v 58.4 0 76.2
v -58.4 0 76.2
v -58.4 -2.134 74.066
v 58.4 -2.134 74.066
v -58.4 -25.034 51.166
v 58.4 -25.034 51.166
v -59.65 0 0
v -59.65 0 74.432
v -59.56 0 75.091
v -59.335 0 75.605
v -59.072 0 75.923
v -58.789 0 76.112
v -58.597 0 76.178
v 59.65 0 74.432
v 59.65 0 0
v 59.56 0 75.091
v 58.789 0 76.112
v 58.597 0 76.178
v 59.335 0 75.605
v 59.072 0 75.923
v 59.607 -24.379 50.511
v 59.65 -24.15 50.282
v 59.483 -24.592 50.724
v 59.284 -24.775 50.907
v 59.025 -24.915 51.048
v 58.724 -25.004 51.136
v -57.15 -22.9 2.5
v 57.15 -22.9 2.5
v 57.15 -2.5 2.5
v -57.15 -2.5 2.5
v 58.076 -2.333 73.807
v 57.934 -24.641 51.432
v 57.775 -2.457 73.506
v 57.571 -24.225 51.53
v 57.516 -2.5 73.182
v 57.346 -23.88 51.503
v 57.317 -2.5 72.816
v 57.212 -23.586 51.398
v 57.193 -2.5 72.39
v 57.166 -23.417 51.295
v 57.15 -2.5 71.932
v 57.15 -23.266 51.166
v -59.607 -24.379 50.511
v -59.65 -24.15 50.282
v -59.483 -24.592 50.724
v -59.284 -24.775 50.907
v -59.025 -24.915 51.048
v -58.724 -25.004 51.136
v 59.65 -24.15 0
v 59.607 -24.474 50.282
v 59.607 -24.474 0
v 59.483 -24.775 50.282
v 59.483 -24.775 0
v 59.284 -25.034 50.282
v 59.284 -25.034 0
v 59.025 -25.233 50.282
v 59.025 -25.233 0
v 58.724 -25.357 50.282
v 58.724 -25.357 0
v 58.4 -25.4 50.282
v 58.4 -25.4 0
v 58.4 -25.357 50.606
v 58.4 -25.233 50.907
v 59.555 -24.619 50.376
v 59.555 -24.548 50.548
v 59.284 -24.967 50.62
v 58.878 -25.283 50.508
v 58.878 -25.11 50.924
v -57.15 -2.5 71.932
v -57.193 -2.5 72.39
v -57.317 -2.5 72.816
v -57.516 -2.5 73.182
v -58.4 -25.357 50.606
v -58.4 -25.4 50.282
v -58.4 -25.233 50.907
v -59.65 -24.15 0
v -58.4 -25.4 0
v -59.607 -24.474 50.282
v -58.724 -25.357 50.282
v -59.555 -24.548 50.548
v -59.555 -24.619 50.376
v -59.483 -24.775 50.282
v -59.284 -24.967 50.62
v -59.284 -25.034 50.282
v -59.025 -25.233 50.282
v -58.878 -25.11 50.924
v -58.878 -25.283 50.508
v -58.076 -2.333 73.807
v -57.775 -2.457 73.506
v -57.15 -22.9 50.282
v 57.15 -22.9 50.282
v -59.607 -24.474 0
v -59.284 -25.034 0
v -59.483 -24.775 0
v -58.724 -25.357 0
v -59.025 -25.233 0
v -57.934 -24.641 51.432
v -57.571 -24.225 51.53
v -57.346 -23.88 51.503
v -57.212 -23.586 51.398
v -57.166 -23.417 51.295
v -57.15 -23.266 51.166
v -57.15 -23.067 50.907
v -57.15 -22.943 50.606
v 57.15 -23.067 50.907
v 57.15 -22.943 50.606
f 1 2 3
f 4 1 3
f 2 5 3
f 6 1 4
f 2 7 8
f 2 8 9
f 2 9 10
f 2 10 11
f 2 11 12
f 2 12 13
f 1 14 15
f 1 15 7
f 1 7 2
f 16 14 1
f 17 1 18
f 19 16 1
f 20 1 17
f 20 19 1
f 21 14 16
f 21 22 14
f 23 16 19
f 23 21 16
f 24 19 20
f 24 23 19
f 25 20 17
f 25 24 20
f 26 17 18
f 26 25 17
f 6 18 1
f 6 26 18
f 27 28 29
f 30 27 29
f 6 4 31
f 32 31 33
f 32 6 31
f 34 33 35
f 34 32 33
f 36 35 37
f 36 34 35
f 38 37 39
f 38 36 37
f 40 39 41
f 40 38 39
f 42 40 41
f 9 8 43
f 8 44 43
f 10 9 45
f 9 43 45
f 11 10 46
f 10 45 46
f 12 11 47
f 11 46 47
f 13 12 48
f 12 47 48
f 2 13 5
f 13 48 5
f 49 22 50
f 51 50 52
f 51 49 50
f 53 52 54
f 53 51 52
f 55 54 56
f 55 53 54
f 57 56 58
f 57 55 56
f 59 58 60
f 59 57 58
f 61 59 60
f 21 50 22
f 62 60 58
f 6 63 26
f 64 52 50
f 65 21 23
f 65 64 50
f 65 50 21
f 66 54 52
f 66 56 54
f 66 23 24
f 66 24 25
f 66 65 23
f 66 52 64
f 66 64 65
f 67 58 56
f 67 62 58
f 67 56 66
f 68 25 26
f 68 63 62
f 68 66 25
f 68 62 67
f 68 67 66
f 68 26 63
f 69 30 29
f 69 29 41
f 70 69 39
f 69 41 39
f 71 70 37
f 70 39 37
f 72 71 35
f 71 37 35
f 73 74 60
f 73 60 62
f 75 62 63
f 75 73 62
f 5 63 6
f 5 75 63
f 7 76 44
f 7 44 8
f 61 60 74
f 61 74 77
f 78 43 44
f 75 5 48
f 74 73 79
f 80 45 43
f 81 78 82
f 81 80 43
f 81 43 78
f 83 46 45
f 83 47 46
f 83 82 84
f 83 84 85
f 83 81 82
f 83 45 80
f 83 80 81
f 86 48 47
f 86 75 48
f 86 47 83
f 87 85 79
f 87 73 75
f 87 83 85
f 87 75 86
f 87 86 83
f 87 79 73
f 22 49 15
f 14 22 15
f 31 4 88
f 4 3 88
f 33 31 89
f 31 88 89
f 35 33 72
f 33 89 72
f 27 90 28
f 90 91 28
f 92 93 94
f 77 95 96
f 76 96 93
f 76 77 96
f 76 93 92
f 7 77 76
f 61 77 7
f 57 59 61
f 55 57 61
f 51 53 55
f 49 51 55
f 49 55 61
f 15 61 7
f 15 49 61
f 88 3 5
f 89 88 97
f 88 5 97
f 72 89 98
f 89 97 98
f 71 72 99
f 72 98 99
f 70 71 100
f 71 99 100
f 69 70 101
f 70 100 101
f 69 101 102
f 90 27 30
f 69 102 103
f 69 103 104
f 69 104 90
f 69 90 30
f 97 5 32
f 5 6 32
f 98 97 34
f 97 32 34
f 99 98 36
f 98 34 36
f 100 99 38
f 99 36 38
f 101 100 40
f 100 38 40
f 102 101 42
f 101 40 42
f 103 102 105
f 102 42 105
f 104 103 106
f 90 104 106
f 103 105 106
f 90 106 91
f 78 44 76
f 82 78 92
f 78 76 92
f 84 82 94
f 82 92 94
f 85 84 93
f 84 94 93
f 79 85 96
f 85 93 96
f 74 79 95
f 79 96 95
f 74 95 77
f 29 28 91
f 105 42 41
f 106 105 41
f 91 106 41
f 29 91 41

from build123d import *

# Parameters (mm, degrees)
F1_DEPTH = 59.65
F3_DEPTH = 57.15
F4_R     = 1.24999


# Not quite as in the source:
# - a fillet or chamfer is up to 0.001 mm smaller than in the source, because OpenCascade refuses the exact size


with BuildPart() as f1:
    # F0 (on Right) → F1 (new body, symmetric)
    with BuildSketch(Plane.YZ):
        Polygon((-25.4, 0), (0, 0), (0, 76.2), (-25.4, 50.8), align=None)
    extrude(amount=F1_DEPTH, both=True)

    # F2 (on Right) → F3 (cut, symmetric)
    with BuildSketch(Plane.YZ):
        Polygon((-2.5, 73.7), (-22.9, 53.3), (-22.9, 2.5), (-2.5, 2.5), align=None)
    extrude(amount=F3_DEPTH, both=True, mode=Mode.SUBTRACT)

    # F4 (radius 1.25 in the source; OpenCascade refuses exactly that, so slightly less here)
    f4_edges = [f1.edges().sort_by_distance(p)[0] for p in [
        (-59.65, -25.4, 25.4),
        (59.65, -25.4, 25.4),
        (59.65, -12.7, 63.5),
        (0, -25.4, 50.8),
        (-59.65, -12.7, 63.5),
        (57.15, -12.7, 63.5),
        (0, -22.9, 53.3),
        (0, -2.5, 73.7),
        (-57.15, -12.7, 63.5),
    ]]
    fillet(f4_edges, radius=F4_R)


solid = f1.part
